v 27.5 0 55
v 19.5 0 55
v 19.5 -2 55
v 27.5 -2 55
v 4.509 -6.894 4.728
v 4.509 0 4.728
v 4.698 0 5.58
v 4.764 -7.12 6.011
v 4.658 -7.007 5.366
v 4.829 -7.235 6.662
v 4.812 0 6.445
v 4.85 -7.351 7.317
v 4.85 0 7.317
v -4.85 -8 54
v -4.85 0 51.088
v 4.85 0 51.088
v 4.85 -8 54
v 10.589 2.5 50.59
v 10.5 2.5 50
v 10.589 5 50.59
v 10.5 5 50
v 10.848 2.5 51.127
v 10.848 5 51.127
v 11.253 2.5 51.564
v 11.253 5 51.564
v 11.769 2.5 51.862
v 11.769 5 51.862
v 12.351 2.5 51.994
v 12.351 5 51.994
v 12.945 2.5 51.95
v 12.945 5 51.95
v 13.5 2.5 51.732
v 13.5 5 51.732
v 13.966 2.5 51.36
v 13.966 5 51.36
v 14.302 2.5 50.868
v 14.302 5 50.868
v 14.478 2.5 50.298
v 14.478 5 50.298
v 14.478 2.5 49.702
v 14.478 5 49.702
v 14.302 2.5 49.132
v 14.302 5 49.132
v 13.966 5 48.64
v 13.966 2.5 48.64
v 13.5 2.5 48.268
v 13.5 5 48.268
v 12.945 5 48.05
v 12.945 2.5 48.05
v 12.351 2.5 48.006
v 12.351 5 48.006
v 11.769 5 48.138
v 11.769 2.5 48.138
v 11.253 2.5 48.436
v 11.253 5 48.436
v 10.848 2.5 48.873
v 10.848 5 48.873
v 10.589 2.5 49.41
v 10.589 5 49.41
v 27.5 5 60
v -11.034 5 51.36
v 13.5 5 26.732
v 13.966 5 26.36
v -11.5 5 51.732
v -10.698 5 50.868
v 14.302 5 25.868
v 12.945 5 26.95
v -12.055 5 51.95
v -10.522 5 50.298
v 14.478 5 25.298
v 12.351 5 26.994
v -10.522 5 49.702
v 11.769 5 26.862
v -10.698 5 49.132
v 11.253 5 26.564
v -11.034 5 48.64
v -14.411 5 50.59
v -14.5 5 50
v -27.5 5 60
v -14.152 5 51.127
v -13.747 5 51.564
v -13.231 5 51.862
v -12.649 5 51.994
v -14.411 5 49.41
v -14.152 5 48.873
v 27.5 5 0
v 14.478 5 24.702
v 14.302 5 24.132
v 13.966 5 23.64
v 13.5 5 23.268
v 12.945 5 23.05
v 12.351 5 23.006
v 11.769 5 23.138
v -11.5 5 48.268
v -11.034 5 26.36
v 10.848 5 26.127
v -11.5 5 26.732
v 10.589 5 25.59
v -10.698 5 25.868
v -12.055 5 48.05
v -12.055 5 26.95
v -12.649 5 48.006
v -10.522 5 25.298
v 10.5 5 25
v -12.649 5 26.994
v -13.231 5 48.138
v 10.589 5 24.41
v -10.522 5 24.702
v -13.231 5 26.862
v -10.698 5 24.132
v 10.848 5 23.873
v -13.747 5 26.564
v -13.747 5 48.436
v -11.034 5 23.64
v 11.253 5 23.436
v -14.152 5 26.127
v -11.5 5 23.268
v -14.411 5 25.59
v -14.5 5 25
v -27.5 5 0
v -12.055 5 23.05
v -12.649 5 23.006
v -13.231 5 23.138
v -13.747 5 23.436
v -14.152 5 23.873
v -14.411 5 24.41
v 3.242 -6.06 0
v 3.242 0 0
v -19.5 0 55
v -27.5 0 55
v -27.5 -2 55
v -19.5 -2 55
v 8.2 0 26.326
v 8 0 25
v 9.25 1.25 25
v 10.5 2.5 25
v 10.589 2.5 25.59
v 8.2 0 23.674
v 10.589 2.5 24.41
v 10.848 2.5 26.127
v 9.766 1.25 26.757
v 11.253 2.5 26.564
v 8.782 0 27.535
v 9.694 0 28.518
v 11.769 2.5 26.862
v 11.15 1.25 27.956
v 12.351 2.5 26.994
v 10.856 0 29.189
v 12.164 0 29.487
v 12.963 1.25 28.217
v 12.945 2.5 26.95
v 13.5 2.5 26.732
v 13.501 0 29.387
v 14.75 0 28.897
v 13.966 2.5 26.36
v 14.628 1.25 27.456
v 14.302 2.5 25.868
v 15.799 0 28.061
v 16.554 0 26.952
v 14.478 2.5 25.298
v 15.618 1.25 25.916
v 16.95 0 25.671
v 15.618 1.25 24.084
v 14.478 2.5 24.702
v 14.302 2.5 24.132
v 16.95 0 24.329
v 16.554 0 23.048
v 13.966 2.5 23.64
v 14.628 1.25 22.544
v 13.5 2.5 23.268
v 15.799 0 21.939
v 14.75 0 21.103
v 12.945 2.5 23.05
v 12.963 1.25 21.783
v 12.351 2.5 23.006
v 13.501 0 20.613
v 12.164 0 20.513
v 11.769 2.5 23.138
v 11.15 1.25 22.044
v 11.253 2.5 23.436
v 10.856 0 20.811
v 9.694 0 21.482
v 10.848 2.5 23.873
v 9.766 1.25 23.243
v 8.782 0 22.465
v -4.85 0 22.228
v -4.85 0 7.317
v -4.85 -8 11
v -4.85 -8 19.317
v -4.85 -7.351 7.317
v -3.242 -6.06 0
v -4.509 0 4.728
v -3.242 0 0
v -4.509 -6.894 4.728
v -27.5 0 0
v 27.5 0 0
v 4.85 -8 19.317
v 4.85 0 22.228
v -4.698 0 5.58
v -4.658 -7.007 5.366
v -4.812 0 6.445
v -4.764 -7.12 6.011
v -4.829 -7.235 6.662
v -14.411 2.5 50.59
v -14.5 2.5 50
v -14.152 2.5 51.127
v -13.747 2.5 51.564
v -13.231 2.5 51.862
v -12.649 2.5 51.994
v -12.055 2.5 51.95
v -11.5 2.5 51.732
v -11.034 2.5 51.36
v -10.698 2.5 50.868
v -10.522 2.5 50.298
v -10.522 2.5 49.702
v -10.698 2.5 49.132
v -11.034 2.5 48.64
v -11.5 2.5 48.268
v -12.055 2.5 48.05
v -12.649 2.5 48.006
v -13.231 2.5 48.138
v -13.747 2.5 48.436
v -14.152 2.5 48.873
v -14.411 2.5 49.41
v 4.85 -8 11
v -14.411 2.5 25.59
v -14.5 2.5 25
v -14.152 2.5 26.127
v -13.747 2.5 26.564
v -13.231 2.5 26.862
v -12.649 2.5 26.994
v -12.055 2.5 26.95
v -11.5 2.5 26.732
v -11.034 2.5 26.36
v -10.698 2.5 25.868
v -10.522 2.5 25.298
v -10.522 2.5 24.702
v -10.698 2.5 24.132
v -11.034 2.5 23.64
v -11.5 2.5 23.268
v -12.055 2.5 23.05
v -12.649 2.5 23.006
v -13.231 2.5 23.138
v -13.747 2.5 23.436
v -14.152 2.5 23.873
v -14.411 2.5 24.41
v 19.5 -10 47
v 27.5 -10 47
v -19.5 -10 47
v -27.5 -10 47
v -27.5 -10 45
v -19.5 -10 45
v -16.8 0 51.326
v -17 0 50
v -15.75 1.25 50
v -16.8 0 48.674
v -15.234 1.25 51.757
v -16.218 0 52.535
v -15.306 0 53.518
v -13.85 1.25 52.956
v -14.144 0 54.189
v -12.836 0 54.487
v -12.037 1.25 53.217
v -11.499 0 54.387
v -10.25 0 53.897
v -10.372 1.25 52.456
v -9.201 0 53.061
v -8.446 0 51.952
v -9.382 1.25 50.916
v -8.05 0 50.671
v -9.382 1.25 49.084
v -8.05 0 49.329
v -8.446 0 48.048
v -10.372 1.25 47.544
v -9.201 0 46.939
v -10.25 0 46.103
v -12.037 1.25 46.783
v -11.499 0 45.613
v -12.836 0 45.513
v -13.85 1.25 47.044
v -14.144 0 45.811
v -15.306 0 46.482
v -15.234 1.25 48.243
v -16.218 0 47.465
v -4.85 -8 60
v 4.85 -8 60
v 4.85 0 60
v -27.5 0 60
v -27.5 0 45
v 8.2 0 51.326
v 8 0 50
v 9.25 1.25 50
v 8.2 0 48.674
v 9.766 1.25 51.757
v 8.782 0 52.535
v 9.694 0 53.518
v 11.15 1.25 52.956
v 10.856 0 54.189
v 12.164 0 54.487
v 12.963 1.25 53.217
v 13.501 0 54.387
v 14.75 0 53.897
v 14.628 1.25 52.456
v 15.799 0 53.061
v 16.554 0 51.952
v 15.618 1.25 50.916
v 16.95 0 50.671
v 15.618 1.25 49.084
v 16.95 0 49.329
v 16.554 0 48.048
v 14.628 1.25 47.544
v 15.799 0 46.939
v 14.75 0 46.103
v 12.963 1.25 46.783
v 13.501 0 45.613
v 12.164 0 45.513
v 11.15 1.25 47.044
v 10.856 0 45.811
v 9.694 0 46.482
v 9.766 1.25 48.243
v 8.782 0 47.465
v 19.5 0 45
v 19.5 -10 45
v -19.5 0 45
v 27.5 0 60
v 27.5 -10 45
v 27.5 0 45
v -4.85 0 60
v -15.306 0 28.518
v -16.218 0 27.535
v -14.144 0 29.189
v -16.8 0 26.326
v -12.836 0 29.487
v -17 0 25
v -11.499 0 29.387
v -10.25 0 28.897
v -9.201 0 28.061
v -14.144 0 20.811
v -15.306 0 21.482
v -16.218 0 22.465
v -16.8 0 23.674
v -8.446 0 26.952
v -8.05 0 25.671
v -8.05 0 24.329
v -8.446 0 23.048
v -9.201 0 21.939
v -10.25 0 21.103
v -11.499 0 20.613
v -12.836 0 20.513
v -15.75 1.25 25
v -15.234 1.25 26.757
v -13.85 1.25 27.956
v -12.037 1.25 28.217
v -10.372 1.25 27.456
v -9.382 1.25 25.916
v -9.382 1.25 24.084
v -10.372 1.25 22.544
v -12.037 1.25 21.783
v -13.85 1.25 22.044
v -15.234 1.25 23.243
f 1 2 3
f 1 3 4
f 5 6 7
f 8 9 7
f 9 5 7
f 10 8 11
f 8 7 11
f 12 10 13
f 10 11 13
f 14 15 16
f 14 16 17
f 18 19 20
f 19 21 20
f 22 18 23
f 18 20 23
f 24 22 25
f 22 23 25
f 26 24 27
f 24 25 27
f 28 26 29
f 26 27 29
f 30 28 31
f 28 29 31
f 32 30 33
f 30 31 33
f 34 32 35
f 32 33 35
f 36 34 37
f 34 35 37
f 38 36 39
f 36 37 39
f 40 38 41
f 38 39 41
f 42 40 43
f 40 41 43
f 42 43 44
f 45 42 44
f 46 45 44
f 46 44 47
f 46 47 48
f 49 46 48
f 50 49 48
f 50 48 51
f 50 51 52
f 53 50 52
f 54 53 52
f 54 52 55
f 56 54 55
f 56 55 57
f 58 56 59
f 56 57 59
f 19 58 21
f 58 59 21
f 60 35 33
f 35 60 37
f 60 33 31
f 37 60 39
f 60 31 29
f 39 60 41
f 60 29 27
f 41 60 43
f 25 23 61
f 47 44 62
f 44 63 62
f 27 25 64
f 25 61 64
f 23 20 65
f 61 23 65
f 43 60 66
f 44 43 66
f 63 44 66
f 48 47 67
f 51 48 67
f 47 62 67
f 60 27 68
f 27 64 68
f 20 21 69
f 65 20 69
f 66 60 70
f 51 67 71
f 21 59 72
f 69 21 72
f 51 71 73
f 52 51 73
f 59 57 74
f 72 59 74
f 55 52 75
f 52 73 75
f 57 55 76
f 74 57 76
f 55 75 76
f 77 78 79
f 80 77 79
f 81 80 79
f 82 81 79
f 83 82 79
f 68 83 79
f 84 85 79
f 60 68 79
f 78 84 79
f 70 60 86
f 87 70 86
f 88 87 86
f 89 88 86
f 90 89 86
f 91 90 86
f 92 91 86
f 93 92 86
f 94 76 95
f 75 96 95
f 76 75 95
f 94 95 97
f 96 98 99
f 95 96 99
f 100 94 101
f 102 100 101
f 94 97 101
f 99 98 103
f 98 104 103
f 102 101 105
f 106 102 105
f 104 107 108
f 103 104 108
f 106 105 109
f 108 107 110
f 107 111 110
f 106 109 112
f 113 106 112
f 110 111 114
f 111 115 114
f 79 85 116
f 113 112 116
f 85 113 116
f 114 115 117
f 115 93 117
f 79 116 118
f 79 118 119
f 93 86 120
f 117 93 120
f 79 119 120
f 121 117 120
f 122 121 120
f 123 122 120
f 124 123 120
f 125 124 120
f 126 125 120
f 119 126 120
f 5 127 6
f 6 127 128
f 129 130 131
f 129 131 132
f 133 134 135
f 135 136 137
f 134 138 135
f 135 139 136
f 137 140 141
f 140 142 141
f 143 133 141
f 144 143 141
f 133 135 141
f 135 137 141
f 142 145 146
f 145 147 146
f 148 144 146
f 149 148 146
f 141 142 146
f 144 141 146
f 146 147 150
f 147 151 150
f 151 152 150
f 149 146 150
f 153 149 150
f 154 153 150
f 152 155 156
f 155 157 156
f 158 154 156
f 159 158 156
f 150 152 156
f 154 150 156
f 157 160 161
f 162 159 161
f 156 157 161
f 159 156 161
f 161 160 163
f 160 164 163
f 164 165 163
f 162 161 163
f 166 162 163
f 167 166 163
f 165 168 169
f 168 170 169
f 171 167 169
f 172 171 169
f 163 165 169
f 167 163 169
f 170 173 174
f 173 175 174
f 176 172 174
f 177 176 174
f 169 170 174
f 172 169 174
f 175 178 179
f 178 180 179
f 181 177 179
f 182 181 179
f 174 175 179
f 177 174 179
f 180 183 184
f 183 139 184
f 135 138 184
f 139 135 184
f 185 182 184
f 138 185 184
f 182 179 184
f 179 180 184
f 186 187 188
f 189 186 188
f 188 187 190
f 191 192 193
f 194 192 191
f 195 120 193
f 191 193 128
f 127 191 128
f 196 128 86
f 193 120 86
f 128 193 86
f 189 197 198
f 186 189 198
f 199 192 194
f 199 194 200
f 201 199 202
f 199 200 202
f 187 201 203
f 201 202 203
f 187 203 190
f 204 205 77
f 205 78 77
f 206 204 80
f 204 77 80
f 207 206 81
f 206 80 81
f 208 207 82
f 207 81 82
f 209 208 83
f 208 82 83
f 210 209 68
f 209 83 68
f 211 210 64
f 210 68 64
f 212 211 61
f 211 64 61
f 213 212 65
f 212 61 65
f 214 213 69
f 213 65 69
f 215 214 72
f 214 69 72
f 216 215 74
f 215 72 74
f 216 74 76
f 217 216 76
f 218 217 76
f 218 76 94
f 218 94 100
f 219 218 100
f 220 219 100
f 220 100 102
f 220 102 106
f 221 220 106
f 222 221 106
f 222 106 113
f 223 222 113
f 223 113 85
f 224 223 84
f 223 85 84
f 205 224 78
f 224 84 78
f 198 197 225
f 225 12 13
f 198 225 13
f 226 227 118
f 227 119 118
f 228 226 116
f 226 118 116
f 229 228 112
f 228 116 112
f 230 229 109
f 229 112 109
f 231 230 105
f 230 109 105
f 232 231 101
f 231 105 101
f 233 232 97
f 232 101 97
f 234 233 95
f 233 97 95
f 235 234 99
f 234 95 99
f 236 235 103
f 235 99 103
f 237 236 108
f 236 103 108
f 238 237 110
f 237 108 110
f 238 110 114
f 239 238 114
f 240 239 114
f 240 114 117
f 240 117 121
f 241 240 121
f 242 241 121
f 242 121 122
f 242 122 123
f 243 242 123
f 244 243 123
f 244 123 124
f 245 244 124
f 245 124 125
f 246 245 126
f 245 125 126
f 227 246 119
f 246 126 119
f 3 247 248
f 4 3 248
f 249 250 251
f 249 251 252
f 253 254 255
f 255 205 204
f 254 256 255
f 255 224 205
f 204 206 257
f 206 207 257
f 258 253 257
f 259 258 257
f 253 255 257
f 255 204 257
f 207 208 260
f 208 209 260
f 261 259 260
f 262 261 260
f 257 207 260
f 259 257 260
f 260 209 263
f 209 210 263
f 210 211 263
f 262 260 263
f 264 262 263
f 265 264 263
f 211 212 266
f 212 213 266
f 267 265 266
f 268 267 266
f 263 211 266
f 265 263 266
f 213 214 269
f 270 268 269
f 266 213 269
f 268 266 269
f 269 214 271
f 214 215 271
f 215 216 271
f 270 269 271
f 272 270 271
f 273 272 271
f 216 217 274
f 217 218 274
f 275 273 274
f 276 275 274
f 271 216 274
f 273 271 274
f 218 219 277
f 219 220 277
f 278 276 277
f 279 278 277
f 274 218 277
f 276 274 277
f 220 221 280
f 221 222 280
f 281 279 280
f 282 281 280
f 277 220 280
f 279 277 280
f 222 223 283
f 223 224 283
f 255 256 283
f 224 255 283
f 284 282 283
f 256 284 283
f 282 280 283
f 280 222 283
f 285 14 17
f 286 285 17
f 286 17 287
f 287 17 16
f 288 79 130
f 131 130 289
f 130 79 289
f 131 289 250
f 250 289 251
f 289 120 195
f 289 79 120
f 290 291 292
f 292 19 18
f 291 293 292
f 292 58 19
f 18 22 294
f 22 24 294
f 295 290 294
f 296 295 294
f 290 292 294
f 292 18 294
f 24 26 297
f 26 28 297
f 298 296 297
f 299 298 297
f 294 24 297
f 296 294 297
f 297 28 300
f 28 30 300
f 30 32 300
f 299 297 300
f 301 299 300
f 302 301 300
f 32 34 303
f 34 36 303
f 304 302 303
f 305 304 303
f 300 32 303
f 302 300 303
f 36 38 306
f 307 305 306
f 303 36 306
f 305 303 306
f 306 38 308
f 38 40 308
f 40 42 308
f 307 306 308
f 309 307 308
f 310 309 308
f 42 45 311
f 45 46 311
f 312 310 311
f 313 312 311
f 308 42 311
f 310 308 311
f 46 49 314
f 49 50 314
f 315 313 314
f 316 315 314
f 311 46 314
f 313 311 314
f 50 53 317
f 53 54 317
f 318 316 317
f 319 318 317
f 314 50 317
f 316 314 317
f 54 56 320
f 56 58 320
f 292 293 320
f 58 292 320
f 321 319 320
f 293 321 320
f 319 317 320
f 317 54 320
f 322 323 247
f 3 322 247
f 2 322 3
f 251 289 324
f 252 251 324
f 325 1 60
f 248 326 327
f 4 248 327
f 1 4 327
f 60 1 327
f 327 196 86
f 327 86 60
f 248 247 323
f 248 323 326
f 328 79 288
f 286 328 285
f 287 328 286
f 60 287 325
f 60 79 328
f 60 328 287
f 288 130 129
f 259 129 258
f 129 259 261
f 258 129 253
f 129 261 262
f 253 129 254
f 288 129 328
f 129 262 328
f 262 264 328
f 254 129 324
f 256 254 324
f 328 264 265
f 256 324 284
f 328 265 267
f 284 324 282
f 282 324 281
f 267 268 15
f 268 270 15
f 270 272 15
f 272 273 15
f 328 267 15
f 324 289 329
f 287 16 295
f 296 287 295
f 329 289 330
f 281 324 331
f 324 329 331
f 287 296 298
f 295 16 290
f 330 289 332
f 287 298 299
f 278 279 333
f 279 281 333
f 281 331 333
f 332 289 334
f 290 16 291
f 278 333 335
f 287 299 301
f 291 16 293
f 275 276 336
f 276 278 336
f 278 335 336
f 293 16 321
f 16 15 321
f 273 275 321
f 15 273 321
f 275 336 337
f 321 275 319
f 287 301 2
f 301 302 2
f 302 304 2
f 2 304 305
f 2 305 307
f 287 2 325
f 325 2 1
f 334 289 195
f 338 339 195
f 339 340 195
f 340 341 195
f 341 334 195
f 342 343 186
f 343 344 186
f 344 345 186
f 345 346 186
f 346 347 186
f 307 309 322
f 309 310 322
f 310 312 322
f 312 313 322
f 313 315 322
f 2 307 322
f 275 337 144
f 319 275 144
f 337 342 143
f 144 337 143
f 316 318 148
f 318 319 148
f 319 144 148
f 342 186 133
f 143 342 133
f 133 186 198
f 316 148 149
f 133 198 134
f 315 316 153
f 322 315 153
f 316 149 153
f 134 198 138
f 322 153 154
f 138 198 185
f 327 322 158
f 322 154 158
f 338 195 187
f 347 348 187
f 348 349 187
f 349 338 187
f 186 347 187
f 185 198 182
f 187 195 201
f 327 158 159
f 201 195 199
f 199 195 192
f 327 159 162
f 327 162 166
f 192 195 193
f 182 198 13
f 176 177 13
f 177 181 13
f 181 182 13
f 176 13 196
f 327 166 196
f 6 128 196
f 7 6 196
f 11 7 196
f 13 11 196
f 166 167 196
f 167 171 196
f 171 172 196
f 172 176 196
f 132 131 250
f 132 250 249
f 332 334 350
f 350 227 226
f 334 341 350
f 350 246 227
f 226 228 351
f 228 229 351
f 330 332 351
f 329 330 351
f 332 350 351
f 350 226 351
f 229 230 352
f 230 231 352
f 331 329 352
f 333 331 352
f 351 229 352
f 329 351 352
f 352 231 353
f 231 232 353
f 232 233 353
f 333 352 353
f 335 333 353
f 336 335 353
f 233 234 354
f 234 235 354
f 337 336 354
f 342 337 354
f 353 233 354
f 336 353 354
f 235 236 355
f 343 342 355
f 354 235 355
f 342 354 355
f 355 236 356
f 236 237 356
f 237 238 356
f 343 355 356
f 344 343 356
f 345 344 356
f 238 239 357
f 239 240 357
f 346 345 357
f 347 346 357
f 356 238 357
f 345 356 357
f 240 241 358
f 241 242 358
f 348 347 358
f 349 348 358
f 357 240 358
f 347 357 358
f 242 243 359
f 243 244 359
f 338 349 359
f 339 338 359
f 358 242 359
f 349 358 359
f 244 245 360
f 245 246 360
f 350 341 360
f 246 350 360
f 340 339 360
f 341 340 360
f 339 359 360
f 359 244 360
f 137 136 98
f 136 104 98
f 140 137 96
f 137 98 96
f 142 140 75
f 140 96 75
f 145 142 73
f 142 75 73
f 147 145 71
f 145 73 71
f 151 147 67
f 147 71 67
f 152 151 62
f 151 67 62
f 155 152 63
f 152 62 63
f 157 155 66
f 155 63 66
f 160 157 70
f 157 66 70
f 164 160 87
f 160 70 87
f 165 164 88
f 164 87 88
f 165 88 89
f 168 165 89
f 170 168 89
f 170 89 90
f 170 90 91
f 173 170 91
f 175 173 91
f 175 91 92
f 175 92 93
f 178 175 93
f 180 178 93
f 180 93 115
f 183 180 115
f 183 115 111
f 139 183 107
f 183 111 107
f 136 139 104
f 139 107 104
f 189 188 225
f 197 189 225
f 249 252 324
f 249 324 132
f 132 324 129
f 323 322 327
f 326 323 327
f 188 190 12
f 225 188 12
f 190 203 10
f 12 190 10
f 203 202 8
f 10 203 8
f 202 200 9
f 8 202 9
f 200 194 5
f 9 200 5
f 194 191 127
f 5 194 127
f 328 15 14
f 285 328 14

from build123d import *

# Parameters (mm, degrees)
F1_DEPTH       = 60
F3_D           = 4
F3_CSINK_D     = 9
F3_CSINK_ANGLE = 90
F4_C1_SIZE2    = 1.6076951546
F4_C1_SIZE     = 6
F4_C2_SIZE2    = 6
F4_C2_SIZE     = 1.6076951546
F6_R           = 10
F5_W           = 8
F5_H           = 10
F7_DEPTH       = 10
F8_SIZE        = 8
F10_DEPTH      = 9.7
F11_SIZE2      = 1.9395967878
F11_SIZE       = 11


# Not quite as in the source:
# - a feature names something its author has since deleted; it is built from what else it names


with BuildPart() as f1:
    # F0 (on Top) → F1 (new body)
    with BuildSketch(Plane.XY):
        Polygon((4.85, 0), (27.5, 0), (27.5, 5), (-27.5, 5), (-27.5, 0), (-4.85, 0), (-4.85, -8), (4.85, -8), align=None)
    extrude(amount=F1_DEPTH)

    # F3 (through all)
    with Locations(Plane.XZ):
        with Locations((-12.5, 50), (-12.5, 25), (12.5, 50), (12.5, 25)):
            CounterSinkHole(F3_D / 2, F3_CSINK_D / 2, counter_sink_angle=F3_CSINK_ANGLE)

    # F4: chamfer of 6 x 1.6076951546 on 2 edges, made by hand

    # F4_c1
    f4_c1_edges = [f1.edges().sort_by_distance(p)[0] for p in [
        (4.85, -4, 0),
    ]]
    f4_c1_side = f1.faces().sort_by_distance((4.85, -4, 0.0321539031))[0]
    chamfer(f4_c1_edges, length=F4_C1_SIZE, length2=F4_C1_SIZE2, reference=f4_c1_side)

    # F4_c2
    f4_c2_edges = [f1.edges().sort_by_distance(p)[0] for p in [
        (-4.85, -4, 0),
    ]]
    f4_c2_side = f1.faces().sort_by_distance((-4.8178460969, -4, 0))[0]
    chamfer(f4_c2_edges, length=F4_C2_SIZE, length2=F4_C2_SIZE2, reference=f4_c2_side)

    # F6
    f6_edges = [f1.edges().sort_by_distance(p)[0] for p in [
        (-4.85, -4, 6),
        (4.85, -4, 6),
    ]]
    fillet(f6_edges, radius=F6_R)

    # F5 (on face) → F7 (join)
    with BuildSketch(Plane.XZ):
        with Locations((-23.5, 50)):
            Rectangle(F5_W, F5_H)
        with Locations((23.5, 50)):
            Rectangle(F5_W, F5_H)
    extrude(amount=F7_DEPTH)

    # F8
    f8_edges = [f1.edges().sort_by_distance(p)[0] for p in [
        (-23.5, -10, 55),
        (23.5, -10, 55),
    ]]
    chamfer(f8_edges, length=F8_SIZE)

    # F9 (on face) → F10 (cut, through all)
    with BuildSketch(Plane.YZ.offset(4.85)):
        Polygon((0, 51.0882381259), (-8, 54), (-8, 19.3165249759), (0, 22.22828685), align=None)
    extrude(amount=-F10_DEPTH, mode=Mode.SUBTRACT)

    # F11
    f11_edges = [f1.edges().sort_by_distance(p)[0] for p in [
        (0, -8, 0),
    ]]
    f11_side = f1.faces().sort_by_distance((0, -8, 10.07737))[0]
    chamfer(f11_edges, length=F11_SIZE, length2=F11_SIZE2, reference=f11_side)


solid = f1.part
